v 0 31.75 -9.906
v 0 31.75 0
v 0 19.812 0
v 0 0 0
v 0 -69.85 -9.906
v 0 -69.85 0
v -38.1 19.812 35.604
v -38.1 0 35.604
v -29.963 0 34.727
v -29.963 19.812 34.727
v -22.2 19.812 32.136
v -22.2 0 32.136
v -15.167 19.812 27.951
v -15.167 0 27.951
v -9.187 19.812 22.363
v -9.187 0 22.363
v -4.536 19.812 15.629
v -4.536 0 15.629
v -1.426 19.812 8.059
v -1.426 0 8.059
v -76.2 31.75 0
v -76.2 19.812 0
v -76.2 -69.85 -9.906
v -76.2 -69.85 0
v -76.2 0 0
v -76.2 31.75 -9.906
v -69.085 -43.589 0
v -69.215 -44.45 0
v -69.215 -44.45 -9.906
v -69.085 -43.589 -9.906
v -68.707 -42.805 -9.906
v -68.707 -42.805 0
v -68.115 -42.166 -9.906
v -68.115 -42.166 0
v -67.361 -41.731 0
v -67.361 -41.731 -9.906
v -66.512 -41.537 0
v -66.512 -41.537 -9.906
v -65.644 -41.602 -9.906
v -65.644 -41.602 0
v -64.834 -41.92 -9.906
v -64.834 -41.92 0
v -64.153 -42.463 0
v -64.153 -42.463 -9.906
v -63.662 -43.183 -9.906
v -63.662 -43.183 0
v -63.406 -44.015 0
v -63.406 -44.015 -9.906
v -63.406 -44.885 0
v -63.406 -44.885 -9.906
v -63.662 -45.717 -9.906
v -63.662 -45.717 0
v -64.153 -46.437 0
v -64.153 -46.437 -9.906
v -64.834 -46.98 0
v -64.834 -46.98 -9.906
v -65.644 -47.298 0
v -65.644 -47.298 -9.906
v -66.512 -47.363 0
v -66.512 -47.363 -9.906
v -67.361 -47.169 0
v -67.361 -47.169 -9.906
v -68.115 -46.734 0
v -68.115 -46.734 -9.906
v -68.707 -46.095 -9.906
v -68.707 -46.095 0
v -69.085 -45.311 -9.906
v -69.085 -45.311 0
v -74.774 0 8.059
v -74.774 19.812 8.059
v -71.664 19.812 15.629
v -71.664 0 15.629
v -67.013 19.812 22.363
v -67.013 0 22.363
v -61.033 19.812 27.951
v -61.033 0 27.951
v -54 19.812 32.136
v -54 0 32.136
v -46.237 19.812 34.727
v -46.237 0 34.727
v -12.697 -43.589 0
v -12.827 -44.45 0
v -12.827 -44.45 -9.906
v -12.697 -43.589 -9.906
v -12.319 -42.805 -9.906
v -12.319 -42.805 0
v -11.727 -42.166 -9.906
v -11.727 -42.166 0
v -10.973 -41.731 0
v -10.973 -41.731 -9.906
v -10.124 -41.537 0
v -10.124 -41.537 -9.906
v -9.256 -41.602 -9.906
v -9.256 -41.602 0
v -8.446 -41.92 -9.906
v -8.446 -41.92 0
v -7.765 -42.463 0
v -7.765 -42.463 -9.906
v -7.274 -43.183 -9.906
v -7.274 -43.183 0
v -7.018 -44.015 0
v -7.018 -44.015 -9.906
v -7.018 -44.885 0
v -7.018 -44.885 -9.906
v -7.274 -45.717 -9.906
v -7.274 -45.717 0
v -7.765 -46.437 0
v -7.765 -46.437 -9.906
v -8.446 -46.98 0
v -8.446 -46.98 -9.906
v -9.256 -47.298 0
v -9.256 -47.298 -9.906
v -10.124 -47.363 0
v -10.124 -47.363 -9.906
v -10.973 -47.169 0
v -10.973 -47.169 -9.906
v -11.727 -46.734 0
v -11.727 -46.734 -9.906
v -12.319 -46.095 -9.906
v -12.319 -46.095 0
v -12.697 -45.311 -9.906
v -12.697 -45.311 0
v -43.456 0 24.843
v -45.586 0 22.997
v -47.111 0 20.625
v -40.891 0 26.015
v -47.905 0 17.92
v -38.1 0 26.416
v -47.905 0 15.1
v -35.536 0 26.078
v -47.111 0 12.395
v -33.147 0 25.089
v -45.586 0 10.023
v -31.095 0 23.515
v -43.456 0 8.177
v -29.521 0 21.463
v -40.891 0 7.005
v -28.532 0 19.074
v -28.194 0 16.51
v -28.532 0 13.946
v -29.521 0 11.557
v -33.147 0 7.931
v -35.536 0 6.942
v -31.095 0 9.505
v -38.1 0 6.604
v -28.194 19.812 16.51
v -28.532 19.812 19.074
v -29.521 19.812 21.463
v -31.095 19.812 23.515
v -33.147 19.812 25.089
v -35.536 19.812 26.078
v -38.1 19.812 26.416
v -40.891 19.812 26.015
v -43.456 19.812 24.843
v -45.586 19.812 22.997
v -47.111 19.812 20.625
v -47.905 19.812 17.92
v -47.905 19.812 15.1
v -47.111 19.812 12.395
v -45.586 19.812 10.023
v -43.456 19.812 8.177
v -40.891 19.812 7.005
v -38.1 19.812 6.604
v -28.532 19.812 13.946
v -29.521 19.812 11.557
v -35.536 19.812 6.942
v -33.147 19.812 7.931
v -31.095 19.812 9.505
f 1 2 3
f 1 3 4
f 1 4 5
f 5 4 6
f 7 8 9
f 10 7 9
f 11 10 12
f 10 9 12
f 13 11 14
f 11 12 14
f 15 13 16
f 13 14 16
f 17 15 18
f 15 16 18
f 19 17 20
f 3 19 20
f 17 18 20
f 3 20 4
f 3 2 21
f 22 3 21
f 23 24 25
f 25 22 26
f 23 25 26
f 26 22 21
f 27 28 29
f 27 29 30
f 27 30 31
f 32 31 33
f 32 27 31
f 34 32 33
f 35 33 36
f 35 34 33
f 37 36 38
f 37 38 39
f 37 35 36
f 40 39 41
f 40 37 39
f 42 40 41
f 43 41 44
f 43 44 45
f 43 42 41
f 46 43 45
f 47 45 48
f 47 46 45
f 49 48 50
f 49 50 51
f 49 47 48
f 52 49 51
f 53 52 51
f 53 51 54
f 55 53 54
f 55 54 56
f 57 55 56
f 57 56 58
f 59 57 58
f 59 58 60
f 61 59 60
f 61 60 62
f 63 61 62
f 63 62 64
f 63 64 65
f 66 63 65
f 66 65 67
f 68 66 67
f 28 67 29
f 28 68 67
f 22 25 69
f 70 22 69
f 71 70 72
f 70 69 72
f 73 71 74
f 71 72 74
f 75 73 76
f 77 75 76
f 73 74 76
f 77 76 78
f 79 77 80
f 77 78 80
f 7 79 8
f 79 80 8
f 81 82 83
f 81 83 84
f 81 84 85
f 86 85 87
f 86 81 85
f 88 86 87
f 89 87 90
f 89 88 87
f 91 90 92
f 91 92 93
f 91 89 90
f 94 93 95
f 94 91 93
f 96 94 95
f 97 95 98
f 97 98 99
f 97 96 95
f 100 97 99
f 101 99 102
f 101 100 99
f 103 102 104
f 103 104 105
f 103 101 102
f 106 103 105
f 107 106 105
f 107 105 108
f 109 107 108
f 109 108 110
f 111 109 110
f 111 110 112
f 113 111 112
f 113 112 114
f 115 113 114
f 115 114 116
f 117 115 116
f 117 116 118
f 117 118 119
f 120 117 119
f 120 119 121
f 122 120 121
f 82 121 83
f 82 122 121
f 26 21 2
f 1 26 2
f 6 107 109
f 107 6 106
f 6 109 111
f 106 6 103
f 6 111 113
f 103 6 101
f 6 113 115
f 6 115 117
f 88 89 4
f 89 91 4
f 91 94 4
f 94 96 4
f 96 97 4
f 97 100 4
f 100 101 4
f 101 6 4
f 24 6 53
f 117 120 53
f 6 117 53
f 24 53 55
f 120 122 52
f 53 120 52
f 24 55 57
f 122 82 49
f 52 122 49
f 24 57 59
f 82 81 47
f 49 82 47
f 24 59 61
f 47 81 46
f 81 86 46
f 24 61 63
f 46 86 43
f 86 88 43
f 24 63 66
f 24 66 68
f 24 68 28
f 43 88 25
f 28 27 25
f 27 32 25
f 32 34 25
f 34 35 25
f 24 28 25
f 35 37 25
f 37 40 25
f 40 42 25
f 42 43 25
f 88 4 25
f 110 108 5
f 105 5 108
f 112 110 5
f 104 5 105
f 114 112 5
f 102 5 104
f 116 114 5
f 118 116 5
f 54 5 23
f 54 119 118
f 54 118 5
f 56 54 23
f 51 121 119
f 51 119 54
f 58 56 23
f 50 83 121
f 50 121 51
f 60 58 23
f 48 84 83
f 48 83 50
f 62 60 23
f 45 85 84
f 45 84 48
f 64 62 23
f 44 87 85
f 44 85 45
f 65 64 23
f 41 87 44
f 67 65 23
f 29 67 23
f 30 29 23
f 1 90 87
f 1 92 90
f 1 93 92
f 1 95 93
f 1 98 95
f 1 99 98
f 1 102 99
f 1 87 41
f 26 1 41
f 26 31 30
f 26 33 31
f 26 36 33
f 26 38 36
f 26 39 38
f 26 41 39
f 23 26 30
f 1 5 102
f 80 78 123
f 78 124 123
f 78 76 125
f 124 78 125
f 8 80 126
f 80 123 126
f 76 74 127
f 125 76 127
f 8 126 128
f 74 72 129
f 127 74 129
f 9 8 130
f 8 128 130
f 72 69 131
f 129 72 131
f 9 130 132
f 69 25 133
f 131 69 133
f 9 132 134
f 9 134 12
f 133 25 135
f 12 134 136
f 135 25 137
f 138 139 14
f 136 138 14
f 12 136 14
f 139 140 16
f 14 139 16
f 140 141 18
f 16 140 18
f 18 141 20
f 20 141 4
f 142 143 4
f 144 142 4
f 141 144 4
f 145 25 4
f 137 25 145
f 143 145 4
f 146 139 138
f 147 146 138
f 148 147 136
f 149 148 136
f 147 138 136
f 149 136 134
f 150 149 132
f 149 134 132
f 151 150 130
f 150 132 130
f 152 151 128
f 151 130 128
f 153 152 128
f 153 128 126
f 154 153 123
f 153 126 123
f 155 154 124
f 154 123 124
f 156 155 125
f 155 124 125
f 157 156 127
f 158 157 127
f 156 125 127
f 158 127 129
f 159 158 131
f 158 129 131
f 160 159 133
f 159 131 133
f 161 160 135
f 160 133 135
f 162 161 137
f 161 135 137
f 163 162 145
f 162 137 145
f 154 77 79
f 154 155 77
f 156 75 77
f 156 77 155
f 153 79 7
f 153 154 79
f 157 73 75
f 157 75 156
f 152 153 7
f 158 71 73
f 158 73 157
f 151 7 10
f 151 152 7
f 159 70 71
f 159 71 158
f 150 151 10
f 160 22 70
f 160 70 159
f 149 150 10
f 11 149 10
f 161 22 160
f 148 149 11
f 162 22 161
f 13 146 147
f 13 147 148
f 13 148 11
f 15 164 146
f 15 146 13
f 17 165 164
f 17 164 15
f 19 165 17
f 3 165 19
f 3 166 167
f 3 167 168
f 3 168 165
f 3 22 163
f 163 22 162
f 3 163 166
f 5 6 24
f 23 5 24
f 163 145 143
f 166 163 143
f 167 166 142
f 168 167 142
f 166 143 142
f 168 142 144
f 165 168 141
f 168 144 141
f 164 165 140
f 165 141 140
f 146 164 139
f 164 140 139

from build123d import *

# Parameters (mm, degrees)
BOSS_EXTRUDE1_DEPTH = 19.812
SKETCH2_R           = 2.921
BOSS_EXTRUDE2_DEPTH = 9.906


with BuildPart() as part:
    # Sketch1 → Boss-Extrude1 (new body)
    with BuildSketch(Plane(origin=(0, 0, 0), x_dir=(1, 0, 0), z_dir=(0, 1, 0))):
        with BuildLine():
            ThreePointArc((-38.1, -35.603754118), (-12.026846627, -25.317436869), (0, 0))
            Line((0, 0), (-38.1, 0))
            Line((-38.1, 0), (-38.1, -6.604))
            ThreePointArc((-38.1, -6.604), (-31.095400226, -9.505400226), (-28.194, -16.51))
            ThreePointArc((-28.194, -16.51), (-31.095400226, -23.514599774), (-38.1, -26.416))
            Line((-38.1, -26.416), (-38.1, -35.603754118))
        make_face()
        with BuildLine():
            Line((-38.1, -6.604), (-38.1, 0))
            Line((-38.1, 0), (-76.2, 0))
            ThreePointArc((-76.2, 0), (-64.173153373, -25.317436869), (-38.1, -35.603754118))
            Line((-38.1, -35.603754118), (-38.1, -26.416))
            ThreePointArc((-38.1, -26.416), (-48.006, -16.51), (-38.1, -6.604))
        make_face()
    extrude(amount=BOSS_EXTRUDE1_DEPTH)

    # Sketch2 → Boss-Extrude2 (add)
    with BuildSketch(Plane(origin=(0, 0, 0), x_dir=(-1, 0, 0), z_dir=(0, 0, -1))):
        Polygon((0, 0), (0, -69.85), (76.2, -69.85), (76.2, 0), (76.2, 31.75), (0, 31.75), align=None)
        with Locations((9.906, -44.45)):
            Circle(SKETCH2_R, mode=Mode.SUBTRACT)
        with Locations((66.294, -44.45)):
            Circle(SKETCH2_R, mode=Mode.SUBTRACT)
    extrude(amount=BOSS_EXTRUDE2_DEPTH)


solid = part.part
